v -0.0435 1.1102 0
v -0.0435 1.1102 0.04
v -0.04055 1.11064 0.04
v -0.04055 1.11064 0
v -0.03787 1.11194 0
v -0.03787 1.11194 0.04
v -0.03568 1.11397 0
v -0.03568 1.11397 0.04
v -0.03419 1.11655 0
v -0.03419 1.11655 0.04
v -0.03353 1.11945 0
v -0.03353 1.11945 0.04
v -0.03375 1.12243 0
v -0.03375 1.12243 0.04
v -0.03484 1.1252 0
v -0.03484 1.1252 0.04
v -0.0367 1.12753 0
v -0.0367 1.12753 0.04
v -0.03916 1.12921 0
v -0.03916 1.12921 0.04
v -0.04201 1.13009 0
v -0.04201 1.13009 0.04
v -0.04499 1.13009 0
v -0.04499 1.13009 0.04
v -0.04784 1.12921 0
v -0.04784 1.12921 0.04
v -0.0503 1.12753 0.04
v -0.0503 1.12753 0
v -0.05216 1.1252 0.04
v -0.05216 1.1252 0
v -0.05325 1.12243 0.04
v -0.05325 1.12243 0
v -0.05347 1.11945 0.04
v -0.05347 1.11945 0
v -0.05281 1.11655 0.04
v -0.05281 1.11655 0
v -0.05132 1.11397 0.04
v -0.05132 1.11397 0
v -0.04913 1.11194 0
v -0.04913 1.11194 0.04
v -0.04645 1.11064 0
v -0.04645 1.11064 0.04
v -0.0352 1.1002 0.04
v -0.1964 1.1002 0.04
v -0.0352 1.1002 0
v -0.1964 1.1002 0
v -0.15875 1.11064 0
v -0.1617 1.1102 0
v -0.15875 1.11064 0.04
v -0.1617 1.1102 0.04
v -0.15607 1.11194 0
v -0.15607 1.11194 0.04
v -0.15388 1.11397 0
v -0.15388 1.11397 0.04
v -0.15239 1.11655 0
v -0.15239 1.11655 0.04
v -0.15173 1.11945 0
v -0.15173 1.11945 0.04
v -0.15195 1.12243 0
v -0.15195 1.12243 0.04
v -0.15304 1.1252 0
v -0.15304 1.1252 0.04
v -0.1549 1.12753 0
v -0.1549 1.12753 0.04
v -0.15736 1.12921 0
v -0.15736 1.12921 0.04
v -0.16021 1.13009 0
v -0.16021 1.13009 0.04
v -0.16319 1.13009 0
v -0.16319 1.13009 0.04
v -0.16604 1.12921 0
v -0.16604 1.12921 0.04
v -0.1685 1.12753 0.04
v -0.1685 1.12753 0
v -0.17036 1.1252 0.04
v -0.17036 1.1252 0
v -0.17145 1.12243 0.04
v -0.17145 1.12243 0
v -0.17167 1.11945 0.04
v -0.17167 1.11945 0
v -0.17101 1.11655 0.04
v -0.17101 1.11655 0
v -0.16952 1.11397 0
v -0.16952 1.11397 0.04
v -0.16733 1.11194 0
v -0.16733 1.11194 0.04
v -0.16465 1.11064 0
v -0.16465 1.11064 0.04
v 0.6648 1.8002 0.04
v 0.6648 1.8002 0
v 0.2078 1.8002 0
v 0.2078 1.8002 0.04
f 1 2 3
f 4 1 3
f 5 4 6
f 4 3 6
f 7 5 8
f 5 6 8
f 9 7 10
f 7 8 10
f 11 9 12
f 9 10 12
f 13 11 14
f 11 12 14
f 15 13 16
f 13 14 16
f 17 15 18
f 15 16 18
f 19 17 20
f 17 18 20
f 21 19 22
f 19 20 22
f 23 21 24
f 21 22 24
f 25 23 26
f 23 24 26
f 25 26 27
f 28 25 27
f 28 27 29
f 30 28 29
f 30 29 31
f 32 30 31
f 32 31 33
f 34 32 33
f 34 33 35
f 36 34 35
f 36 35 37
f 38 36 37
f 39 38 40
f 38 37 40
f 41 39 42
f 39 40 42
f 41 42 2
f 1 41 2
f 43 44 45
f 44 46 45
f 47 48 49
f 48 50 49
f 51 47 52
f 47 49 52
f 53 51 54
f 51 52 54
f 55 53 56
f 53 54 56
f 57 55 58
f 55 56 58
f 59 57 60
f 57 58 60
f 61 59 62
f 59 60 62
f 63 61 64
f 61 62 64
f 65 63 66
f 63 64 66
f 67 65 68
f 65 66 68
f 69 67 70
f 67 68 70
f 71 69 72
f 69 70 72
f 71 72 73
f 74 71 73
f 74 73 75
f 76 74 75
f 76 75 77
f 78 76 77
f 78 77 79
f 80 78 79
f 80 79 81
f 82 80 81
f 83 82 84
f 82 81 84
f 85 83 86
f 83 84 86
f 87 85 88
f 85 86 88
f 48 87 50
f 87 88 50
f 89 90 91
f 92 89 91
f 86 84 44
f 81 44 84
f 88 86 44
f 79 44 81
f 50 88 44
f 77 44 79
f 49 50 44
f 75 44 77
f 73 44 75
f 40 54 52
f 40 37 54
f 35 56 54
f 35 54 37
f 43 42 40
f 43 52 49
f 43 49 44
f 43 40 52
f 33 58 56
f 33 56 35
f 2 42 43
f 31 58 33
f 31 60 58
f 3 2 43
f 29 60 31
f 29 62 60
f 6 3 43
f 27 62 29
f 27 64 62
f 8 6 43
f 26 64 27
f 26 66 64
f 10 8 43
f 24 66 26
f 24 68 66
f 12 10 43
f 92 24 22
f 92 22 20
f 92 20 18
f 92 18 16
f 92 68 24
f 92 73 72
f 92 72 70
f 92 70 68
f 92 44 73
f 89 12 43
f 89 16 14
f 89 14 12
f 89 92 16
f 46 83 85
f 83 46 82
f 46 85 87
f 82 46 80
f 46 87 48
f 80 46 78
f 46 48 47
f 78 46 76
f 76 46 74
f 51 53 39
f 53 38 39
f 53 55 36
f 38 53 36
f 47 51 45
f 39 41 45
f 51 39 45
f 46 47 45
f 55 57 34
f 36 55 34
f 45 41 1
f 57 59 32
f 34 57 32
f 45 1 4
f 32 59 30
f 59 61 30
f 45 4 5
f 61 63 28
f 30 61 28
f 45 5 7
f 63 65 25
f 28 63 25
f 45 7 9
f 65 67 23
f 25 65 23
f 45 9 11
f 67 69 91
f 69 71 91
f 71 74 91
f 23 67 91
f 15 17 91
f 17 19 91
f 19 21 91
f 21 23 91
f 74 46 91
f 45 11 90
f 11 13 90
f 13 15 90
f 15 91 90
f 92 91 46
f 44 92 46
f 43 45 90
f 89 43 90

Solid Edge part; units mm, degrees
sketch "Sketch1" plane through (0, 0, 0) normal (0, 0, 1) x (1, 0, 0)
  line L0 (-0.0352, 1.1002) -> (0.6648, 1.8002)
  line L1 (0.6648, 1.8002) -> (0.2078, 1.8002)
  line L2 (0.2078, 1.8002) -> (-0.1964, 1.1002)
  line L3 (-0.1964, 1.1002) -> (-0.0352, 1.1002)
extrude "Protrusion1" add sketch "Sketch1" along normal blind 0.04
hole "Bohrung_9" at (-0.1617, 1.1202, 0.04) direction (0, 0, -1) diameter 0.02 end through all
hole "Hole1" at (-0.0435, 1.1202, 0.04) direction (0, 0, -1) diameter 0.02 end through all
